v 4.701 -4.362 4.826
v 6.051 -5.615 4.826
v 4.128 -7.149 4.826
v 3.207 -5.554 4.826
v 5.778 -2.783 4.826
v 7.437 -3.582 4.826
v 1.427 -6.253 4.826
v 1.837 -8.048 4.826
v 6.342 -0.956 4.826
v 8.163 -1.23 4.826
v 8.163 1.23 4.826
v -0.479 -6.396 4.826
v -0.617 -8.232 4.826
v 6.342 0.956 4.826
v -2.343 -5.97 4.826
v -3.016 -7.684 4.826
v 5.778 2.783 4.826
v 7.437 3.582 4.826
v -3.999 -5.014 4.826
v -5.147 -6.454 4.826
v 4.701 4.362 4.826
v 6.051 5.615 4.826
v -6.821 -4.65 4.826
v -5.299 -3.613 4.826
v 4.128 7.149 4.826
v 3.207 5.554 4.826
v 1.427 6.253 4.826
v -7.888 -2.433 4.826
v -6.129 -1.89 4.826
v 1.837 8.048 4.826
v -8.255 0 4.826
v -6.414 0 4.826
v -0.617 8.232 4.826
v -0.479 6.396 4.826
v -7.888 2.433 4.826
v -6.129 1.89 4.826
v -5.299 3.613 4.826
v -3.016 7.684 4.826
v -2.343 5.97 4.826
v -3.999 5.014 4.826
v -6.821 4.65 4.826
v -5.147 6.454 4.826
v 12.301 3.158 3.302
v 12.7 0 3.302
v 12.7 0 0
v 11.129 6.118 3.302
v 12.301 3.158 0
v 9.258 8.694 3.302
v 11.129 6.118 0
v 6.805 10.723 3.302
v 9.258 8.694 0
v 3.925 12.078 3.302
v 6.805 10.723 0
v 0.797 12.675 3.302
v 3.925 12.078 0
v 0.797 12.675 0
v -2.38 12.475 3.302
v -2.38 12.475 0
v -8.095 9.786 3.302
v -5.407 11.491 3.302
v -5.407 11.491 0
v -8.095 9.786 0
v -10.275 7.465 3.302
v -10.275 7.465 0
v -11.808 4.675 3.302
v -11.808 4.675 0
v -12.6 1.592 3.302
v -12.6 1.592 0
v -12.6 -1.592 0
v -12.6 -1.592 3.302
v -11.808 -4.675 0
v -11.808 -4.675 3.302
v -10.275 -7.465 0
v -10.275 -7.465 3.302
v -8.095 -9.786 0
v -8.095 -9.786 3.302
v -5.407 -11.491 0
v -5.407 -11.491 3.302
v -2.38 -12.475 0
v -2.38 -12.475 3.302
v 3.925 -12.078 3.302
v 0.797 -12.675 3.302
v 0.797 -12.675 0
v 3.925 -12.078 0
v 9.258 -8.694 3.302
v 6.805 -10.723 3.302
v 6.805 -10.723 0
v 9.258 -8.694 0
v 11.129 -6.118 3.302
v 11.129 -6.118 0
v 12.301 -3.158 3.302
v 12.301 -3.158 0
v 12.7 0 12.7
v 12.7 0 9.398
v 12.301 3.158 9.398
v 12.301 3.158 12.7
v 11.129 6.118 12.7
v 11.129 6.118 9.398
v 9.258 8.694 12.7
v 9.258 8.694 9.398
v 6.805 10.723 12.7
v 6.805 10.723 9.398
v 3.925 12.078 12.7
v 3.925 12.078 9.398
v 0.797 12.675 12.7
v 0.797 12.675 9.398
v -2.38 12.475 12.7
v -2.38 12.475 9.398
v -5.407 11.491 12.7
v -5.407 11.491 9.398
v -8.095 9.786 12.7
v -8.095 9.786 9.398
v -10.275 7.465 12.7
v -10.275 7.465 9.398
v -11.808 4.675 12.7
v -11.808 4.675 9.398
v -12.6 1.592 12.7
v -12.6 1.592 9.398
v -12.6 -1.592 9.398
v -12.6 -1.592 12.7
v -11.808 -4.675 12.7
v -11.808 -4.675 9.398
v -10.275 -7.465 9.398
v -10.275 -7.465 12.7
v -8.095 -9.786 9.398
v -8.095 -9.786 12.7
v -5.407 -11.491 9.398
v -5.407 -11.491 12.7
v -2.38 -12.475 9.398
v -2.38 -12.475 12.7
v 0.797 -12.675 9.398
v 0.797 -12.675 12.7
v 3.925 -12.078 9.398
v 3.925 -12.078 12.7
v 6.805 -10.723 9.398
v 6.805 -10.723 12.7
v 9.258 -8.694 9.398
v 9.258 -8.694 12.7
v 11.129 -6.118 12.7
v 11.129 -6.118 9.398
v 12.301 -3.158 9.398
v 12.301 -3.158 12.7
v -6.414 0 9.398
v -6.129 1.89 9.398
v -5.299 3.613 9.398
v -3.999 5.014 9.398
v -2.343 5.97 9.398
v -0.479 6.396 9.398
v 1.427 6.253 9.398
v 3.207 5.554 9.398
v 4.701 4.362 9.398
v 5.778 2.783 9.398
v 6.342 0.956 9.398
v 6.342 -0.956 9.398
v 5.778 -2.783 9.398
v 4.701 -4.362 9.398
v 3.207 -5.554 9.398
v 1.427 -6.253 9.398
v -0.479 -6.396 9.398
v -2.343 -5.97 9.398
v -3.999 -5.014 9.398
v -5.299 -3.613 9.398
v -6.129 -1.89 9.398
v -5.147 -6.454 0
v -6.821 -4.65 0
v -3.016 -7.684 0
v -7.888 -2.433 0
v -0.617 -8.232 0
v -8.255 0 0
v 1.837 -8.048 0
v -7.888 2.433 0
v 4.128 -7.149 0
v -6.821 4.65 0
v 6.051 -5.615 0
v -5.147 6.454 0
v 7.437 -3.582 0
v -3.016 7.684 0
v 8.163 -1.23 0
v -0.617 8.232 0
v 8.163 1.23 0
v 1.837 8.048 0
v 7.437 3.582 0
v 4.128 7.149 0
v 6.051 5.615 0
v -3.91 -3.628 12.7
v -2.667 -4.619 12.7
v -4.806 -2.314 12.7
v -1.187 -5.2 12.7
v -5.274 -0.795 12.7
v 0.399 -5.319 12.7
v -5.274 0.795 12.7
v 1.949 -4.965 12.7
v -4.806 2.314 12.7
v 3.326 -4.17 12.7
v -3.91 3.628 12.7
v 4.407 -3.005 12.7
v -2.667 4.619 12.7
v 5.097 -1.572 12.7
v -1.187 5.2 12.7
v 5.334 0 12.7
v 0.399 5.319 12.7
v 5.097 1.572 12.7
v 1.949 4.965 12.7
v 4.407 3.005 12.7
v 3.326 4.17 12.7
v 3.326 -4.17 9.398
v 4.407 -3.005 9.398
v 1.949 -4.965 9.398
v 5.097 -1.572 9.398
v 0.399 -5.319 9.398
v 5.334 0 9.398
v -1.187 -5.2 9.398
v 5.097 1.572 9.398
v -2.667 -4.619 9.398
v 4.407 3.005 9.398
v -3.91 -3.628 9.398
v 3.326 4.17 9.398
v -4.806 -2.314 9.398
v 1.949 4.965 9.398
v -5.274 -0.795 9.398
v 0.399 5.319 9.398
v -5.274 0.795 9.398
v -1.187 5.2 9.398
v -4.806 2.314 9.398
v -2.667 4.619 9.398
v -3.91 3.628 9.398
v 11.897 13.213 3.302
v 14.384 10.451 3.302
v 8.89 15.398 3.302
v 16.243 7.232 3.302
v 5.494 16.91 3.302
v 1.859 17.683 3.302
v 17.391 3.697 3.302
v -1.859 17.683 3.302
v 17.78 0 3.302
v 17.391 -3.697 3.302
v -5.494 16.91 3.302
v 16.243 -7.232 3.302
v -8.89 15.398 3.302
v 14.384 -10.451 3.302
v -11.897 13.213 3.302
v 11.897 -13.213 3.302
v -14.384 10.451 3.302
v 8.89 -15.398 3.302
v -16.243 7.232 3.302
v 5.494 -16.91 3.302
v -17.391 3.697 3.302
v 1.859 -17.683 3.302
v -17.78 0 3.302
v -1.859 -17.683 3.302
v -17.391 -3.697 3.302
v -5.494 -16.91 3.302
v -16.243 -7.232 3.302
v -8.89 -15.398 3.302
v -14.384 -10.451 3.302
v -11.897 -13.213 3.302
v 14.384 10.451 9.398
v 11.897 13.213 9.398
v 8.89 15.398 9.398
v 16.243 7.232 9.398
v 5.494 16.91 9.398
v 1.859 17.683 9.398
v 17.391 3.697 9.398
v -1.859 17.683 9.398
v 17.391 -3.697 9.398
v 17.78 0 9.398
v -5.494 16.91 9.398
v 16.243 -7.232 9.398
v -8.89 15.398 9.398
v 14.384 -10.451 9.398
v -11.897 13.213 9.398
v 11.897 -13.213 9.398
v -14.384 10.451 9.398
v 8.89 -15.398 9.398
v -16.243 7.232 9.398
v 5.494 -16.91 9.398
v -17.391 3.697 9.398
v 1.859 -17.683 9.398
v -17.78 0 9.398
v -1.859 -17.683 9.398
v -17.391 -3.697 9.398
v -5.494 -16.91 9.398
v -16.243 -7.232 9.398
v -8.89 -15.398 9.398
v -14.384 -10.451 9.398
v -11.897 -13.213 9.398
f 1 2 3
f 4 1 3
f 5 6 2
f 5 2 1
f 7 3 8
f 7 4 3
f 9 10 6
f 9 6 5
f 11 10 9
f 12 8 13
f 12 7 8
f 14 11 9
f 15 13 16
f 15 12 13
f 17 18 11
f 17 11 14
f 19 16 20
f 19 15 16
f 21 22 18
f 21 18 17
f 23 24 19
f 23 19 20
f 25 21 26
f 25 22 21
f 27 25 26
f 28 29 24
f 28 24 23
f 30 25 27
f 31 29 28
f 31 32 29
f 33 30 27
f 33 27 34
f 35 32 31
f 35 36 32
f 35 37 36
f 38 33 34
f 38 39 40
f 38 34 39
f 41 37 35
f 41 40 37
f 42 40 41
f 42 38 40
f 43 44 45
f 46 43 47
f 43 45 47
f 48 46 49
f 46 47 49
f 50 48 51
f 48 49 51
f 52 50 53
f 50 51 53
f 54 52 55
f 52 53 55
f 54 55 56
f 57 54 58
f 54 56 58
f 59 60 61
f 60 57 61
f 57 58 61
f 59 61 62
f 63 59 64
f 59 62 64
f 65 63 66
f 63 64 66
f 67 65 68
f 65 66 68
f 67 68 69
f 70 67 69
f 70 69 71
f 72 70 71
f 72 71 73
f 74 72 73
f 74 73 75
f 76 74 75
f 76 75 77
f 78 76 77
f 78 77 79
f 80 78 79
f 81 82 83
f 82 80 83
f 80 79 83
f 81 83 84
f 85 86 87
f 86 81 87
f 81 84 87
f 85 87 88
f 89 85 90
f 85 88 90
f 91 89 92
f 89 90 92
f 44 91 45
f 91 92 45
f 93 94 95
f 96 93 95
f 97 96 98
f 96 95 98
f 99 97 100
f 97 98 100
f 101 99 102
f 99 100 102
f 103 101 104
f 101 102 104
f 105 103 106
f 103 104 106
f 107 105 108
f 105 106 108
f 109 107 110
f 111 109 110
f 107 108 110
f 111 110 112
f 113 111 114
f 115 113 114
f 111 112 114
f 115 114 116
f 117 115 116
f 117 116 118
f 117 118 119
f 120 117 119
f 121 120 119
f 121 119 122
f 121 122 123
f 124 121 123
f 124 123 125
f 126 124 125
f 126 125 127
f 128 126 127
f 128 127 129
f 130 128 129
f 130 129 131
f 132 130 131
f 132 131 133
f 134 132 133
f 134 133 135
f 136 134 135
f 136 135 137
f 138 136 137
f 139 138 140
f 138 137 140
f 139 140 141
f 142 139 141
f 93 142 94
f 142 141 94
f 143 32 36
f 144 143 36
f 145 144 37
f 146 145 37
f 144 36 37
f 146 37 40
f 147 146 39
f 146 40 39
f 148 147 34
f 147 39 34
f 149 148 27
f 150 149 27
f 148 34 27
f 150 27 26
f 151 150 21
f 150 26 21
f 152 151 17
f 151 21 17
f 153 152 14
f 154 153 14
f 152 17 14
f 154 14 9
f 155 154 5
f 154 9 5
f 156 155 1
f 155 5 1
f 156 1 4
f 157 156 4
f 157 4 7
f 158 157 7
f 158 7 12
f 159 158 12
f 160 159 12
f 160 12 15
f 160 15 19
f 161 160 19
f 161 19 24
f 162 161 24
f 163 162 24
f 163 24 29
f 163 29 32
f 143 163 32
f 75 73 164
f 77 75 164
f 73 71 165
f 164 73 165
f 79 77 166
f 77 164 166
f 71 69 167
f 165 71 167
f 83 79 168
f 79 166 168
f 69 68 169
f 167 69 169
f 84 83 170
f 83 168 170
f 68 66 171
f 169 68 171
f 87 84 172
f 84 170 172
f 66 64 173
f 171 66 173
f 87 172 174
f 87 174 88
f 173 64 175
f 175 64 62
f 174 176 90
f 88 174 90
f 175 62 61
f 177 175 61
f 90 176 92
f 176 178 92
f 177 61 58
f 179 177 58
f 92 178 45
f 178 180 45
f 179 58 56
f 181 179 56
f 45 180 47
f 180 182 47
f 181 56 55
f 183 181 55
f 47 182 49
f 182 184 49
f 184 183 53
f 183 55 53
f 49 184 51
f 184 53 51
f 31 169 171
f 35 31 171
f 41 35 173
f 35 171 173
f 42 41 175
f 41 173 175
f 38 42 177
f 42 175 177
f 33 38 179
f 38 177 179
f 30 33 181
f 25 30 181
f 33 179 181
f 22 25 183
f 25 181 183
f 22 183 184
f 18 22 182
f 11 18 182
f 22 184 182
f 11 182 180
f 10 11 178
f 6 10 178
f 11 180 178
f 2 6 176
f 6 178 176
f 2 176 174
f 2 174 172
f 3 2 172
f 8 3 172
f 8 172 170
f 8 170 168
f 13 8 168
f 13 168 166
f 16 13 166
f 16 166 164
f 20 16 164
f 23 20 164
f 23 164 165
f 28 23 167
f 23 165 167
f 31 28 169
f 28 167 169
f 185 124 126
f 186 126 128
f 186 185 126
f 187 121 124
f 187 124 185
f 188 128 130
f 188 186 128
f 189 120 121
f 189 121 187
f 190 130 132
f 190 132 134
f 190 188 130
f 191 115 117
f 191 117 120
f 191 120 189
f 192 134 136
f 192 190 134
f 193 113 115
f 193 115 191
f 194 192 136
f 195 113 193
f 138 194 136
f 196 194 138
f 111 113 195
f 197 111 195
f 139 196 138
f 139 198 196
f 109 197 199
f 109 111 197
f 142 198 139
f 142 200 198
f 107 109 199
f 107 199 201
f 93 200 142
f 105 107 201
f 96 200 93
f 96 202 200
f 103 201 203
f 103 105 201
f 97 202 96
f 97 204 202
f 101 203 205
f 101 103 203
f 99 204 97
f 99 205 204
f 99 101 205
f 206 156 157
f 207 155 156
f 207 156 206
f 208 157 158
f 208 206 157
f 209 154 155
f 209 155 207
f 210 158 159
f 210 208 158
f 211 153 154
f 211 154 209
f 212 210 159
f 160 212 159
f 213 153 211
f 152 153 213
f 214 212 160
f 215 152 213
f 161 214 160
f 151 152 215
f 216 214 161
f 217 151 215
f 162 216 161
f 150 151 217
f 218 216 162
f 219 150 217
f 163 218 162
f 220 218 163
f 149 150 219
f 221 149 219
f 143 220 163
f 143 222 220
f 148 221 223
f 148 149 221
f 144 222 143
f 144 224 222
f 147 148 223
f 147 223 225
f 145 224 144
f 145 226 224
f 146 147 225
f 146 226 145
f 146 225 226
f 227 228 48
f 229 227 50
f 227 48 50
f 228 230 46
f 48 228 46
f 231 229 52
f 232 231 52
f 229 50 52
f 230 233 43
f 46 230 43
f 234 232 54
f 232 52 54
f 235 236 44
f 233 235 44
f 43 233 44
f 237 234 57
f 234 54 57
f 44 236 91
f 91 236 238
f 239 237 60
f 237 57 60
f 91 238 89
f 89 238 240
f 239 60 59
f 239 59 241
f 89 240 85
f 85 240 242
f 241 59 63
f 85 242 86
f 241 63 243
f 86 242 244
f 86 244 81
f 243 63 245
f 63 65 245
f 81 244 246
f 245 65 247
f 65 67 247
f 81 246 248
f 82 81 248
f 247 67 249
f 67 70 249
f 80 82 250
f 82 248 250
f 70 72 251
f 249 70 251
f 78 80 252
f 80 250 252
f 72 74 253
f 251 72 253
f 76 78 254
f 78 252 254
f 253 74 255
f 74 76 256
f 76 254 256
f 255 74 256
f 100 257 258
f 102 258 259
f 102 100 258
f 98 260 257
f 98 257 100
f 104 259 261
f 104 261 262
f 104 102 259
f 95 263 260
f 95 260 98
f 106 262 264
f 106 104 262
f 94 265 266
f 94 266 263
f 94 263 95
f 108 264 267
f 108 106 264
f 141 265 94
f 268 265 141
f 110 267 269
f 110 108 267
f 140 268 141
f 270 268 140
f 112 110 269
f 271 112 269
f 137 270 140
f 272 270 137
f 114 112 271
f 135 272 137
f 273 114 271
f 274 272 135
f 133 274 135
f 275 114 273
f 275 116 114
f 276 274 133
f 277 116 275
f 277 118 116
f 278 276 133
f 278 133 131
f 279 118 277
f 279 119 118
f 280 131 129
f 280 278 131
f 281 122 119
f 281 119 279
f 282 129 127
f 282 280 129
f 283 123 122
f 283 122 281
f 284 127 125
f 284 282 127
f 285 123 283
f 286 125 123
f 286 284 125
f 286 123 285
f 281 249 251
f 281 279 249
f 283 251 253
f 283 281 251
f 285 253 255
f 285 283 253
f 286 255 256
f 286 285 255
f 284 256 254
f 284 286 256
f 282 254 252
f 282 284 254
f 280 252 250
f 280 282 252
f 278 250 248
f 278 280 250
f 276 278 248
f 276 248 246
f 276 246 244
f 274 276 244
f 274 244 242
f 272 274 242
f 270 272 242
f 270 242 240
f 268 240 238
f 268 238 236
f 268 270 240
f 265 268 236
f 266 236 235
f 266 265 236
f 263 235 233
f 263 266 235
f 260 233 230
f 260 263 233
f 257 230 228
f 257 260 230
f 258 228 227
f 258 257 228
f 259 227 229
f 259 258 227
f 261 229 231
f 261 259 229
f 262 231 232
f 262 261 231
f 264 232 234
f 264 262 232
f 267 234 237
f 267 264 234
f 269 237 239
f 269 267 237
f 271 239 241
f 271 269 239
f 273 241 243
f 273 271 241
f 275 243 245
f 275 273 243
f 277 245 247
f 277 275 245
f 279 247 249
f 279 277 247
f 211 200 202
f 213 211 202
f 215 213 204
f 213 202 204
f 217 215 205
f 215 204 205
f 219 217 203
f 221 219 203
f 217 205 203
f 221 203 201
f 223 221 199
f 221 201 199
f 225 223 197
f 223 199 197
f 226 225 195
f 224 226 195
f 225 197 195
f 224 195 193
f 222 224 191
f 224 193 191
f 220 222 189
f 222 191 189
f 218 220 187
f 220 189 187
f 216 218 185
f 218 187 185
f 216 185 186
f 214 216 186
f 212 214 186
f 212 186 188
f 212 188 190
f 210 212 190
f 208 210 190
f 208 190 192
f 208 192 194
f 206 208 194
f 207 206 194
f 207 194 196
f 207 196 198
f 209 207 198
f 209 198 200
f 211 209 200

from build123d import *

# Parameters (mm, degrees)
SKETCH1_R           = 12.7
BOSS_EXTRUDE1_DEPTH = 12.7
SKETCH2_R           = 17.78
BOSS_EXTRUDE2_DEPTH = 3.048
SKETCH5_R           = 6.4135
CUT_EXTRUDE1_DEPTH  = 9.398
SKETCH6_R           = 5.334
CUT_EXTRUDE2_DEPTH  = 29.169962726
SKETCH7_R           = 8.255
CUT_EXTRUDE3_DEPTH  = 4.826


with BuildPart() as part:
    # Sketch1 → Boss-Extrude1 (new body)
    with BuildSketch(Plane.XY):
        Circle(SKETCH1_R)
    extrude(amount=BOSS_EXTRUDE1_DEPTH)

    # Sketch2 → Boss-Extrude2 (add, symmetric)
    with BuildSketch(Plane.XY.offset(6.35)):
        with Locations(Location((0, 0, 0), (0, 0, 180))):
            Circle(SKETCH2_R)
    extrude(amount=BOSS_EXTRUDE2_DEPTH, both=True)

    # Sketch5 → Cut-Extrude1 (cut)
    with BuildSketch(Plane(origin=(0, 0, 0), x_dir=(-1, 0, 0), z_dir=(0, 0, -1))):
        Circle(SKETCH5_R)
    extrude(amount=-CUT_EXTRUDE1_DEPTH, mode=Mode.SUBTRACT)

    # Sketch6 → Cut-Extrude2 (cut, through all)
    with BuildSketch(Plane.XY.offset(12.7)):
        Circle(SKETCH6_R)
    extrude(amount=-CUT_EXTRUDE2_DEPTH, mode=Mode.SUBTRACT)

    # Sketch7 → Cut-Extrude3 (cut)
    with BuildSketch(Plane(origin=(0, 0, 0), x_dir=(-1, 0, 0), z_dir=(0, 0, -1))):
        Circle(SKETCH7_R)
    extrude(amount=-CUT_EXTRUDE3_DEPTH, mode=Mode.SUBTRACT)


solid = part.part
